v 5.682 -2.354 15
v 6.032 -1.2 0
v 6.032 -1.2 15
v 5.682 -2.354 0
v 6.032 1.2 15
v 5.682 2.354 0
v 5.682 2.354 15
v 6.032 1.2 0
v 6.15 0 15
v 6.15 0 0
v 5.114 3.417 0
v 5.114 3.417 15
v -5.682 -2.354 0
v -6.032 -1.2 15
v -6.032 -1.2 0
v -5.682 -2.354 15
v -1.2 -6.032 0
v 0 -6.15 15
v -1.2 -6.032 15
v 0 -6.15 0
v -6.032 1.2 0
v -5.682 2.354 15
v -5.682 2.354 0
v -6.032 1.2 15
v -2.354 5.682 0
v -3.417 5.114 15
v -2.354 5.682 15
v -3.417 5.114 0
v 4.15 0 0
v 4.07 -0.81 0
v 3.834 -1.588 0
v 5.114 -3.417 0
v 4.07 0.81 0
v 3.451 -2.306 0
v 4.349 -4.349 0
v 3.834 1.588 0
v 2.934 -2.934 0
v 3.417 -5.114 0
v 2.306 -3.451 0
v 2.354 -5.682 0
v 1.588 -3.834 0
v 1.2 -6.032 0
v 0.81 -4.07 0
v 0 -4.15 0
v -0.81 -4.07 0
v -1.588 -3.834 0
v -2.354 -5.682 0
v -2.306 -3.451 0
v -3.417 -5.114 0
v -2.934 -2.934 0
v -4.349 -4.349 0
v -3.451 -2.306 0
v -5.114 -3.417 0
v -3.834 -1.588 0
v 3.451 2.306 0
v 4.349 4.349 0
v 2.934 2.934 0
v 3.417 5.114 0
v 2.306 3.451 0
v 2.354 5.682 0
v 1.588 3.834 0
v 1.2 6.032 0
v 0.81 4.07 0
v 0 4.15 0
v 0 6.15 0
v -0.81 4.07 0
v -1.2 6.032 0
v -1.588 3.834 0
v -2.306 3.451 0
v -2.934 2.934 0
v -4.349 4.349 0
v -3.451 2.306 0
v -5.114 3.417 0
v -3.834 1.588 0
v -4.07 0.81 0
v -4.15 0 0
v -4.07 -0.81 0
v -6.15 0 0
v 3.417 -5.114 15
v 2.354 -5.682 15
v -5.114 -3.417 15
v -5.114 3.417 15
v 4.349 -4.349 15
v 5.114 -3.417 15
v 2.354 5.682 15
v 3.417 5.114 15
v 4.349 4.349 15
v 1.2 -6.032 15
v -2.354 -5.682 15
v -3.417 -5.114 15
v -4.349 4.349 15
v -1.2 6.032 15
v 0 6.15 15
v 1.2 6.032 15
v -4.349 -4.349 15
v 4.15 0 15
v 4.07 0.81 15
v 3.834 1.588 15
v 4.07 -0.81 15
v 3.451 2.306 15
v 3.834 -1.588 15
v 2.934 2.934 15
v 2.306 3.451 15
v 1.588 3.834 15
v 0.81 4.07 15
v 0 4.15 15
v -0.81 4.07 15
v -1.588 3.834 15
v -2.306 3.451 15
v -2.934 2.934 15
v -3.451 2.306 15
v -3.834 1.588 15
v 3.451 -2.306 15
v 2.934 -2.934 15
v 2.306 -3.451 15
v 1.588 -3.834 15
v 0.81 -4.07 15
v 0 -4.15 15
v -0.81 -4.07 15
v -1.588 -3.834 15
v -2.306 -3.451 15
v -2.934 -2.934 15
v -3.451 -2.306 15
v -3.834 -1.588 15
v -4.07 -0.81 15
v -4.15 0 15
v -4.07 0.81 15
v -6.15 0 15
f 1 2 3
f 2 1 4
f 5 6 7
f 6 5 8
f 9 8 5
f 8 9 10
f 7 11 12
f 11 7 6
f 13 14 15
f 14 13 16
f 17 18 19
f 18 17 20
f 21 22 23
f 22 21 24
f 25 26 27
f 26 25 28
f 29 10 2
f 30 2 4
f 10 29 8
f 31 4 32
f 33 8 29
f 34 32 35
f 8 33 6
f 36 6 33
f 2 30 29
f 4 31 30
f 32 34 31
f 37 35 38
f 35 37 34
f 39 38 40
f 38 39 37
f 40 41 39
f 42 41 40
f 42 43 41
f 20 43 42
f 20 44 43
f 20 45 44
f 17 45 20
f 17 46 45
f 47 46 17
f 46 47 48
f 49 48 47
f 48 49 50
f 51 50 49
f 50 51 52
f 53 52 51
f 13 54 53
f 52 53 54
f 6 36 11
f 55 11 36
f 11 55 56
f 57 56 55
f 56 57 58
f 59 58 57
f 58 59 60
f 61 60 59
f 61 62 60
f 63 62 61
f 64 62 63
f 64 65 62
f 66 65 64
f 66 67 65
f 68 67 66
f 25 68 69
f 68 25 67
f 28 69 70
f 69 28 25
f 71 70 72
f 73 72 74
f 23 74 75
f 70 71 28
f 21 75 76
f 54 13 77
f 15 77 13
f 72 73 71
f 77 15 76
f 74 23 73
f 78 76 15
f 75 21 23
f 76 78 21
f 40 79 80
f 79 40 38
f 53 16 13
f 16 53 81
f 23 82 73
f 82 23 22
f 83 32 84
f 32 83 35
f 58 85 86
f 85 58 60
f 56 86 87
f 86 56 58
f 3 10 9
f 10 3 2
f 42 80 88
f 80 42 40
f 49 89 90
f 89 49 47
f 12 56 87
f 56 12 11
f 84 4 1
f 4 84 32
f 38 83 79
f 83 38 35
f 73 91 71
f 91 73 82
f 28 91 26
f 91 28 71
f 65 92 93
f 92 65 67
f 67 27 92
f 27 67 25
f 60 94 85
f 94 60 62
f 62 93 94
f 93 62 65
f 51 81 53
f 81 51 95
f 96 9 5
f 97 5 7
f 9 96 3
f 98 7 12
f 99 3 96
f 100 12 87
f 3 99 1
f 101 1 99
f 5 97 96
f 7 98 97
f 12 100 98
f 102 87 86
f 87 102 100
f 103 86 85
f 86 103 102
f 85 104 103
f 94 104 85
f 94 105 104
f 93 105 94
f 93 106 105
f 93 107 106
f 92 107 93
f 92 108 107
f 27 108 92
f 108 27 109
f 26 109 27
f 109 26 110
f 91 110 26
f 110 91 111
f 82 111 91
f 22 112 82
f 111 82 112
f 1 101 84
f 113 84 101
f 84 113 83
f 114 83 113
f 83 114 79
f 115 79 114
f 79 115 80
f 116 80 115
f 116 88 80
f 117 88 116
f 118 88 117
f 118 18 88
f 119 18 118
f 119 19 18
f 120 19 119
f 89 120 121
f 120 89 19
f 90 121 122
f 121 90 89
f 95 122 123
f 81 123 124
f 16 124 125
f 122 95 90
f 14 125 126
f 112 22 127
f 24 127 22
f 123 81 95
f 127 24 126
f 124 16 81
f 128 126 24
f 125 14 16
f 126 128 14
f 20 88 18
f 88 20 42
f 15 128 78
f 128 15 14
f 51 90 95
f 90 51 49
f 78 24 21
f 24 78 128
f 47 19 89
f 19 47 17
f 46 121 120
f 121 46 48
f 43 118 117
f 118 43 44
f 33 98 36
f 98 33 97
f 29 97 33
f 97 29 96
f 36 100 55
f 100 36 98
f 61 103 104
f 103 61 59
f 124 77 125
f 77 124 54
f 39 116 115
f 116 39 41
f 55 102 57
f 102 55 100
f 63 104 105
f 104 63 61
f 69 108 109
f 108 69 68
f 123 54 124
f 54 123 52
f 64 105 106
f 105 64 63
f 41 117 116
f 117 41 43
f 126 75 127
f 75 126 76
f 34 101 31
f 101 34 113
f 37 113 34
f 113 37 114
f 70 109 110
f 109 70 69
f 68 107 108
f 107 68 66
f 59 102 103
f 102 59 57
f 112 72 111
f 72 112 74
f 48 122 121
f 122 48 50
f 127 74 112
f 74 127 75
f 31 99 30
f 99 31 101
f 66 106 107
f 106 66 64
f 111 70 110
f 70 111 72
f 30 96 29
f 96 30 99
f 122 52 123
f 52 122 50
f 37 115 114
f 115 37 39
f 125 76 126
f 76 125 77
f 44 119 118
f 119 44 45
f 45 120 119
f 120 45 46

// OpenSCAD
$fn = 32;

// ----------------------------------------------------------------------
// Spacer sleeve: 12.3 / 8.3 x 15 mm
// ----------------------------------------------------------------------

// --- parameters (mm) ---
sleeve_od = 12.3;         // outside diameter
sleeve_id = 8.3;          // shaft bore
sleeve_l = 15;            // sleeve length

module sleeve() {
  cylinder(h = sleeve_l, d = sleeve_od);
}

difference() {
  sleeve();
  translate([0, 0, -1]) cylinder(h = sleeve_l + 2, d = sleeve_id);
}
